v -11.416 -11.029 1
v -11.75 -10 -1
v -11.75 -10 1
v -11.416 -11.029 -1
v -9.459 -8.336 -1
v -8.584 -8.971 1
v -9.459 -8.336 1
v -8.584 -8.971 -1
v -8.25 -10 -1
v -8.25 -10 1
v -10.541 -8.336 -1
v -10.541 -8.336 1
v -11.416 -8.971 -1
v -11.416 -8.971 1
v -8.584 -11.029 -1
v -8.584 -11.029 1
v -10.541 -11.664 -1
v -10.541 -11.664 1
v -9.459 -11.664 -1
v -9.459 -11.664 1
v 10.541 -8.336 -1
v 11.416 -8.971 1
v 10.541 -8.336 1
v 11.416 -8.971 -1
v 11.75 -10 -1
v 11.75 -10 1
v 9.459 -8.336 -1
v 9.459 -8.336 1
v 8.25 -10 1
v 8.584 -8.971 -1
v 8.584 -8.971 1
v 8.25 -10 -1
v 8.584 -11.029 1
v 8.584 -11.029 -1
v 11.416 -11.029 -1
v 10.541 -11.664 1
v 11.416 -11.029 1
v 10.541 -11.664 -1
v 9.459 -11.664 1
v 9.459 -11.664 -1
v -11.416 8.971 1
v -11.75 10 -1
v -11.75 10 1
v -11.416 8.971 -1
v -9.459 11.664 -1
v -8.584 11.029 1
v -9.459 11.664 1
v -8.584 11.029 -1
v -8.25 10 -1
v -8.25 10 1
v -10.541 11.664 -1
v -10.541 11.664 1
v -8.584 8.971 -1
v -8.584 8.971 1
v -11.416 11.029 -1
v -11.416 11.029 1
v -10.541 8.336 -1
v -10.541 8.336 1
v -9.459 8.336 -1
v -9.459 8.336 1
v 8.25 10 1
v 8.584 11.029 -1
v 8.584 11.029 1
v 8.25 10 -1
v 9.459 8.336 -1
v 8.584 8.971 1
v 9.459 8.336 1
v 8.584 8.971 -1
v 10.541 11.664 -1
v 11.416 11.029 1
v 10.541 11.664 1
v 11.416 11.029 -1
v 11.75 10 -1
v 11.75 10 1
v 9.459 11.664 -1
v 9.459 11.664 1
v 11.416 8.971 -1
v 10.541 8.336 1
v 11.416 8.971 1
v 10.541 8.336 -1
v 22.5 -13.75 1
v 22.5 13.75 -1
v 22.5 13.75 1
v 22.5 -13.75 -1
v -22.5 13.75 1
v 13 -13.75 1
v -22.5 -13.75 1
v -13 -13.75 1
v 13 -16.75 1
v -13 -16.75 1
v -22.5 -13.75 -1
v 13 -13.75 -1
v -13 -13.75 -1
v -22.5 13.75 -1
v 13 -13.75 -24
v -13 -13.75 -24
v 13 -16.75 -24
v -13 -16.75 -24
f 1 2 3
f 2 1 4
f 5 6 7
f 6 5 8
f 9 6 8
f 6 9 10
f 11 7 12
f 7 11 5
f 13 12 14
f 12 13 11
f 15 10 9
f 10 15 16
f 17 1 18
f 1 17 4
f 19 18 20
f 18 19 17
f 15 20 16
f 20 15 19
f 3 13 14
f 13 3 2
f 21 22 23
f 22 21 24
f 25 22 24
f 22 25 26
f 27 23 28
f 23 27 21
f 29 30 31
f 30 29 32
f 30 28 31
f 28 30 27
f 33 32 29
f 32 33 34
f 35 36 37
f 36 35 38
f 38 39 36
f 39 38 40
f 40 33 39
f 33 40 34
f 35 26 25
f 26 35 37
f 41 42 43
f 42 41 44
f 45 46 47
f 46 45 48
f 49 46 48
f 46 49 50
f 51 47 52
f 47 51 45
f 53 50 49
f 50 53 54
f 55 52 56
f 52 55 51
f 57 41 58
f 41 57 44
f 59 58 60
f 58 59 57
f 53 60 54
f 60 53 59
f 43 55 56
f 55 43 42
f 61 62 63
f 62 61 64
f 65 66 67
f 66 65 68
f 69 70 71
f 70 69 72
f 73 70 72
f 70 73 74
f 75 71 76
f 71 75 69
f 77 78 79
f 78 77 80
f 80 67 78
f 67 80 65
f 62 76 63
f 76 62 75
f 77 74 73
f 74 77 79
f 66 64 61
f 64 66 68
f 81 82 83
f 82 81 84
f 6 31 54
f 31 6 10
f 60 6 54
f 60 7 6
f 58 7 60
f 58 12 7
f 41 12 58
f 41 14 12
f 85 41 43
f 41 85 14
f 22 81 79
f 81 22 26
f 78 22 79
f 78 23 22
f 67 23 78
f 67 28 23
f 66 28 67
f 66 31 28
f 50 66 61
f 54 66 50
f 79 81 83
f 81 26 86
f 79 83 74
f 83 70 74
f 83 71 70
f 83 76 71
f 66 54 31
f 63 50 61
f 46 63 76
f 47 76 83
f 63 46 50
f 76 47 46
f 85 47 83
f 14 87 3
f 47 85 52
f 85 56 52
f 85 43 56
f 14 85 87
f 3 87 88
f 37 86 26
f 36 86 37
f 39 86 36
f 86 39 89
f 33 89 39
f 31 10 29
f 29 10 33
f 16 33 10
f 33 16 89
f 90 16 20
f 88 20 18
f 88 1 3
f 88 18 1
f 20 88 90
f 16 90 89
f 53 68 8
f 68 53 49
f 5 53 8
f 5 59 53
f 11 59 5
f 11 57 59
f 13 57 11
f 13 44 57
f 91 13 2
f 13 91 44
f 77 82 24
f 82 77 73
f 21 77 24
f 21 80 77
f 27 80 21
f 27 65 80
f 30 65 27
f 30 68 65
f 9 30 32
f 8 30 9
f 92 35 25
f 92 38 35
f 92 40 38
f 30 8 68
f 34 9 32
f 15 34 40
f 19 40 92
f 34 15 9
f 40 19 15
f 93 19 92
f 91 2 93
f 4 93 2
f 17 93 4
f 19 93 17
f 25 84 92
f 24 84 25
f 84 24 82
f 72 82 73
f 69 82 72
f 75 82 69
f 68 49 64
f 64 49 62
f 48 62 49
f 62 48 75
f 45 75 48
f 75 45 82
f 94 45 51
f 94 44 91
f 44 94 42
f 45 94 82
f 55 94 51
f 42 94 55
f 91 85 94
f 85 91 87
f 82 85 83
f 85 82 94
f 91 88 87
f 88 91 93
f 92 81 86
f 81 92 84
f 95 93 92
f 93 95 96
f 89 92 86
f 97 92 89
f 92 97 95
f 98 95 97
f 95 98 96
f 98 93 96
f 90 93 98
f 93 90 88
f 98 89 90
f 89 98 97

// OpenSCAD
dicke = 2;
lochx = 10.00;
mgnx = 45;
mgny = 27.5;
function leftRight(x,mod = 2)= (x%mod >= mod/2)? 1: -1;
difference()
{
  cube([mgnx,mgny,dicke], center = true);
  color("red")
    for(n = [0:3]) 
      translate([leftRight(n)*lochx,leftRight(n,4)*lochx,-dicke])cylinder(d=3.5, h=2*dicke, $fn=10);
}
 mosqy  =1.5*dicke;
color("magenta")
  translate([0,-mgny/2-mosqy/2,-12.5+dicke/2])
  cube([26,mosqy,25], center = true);
